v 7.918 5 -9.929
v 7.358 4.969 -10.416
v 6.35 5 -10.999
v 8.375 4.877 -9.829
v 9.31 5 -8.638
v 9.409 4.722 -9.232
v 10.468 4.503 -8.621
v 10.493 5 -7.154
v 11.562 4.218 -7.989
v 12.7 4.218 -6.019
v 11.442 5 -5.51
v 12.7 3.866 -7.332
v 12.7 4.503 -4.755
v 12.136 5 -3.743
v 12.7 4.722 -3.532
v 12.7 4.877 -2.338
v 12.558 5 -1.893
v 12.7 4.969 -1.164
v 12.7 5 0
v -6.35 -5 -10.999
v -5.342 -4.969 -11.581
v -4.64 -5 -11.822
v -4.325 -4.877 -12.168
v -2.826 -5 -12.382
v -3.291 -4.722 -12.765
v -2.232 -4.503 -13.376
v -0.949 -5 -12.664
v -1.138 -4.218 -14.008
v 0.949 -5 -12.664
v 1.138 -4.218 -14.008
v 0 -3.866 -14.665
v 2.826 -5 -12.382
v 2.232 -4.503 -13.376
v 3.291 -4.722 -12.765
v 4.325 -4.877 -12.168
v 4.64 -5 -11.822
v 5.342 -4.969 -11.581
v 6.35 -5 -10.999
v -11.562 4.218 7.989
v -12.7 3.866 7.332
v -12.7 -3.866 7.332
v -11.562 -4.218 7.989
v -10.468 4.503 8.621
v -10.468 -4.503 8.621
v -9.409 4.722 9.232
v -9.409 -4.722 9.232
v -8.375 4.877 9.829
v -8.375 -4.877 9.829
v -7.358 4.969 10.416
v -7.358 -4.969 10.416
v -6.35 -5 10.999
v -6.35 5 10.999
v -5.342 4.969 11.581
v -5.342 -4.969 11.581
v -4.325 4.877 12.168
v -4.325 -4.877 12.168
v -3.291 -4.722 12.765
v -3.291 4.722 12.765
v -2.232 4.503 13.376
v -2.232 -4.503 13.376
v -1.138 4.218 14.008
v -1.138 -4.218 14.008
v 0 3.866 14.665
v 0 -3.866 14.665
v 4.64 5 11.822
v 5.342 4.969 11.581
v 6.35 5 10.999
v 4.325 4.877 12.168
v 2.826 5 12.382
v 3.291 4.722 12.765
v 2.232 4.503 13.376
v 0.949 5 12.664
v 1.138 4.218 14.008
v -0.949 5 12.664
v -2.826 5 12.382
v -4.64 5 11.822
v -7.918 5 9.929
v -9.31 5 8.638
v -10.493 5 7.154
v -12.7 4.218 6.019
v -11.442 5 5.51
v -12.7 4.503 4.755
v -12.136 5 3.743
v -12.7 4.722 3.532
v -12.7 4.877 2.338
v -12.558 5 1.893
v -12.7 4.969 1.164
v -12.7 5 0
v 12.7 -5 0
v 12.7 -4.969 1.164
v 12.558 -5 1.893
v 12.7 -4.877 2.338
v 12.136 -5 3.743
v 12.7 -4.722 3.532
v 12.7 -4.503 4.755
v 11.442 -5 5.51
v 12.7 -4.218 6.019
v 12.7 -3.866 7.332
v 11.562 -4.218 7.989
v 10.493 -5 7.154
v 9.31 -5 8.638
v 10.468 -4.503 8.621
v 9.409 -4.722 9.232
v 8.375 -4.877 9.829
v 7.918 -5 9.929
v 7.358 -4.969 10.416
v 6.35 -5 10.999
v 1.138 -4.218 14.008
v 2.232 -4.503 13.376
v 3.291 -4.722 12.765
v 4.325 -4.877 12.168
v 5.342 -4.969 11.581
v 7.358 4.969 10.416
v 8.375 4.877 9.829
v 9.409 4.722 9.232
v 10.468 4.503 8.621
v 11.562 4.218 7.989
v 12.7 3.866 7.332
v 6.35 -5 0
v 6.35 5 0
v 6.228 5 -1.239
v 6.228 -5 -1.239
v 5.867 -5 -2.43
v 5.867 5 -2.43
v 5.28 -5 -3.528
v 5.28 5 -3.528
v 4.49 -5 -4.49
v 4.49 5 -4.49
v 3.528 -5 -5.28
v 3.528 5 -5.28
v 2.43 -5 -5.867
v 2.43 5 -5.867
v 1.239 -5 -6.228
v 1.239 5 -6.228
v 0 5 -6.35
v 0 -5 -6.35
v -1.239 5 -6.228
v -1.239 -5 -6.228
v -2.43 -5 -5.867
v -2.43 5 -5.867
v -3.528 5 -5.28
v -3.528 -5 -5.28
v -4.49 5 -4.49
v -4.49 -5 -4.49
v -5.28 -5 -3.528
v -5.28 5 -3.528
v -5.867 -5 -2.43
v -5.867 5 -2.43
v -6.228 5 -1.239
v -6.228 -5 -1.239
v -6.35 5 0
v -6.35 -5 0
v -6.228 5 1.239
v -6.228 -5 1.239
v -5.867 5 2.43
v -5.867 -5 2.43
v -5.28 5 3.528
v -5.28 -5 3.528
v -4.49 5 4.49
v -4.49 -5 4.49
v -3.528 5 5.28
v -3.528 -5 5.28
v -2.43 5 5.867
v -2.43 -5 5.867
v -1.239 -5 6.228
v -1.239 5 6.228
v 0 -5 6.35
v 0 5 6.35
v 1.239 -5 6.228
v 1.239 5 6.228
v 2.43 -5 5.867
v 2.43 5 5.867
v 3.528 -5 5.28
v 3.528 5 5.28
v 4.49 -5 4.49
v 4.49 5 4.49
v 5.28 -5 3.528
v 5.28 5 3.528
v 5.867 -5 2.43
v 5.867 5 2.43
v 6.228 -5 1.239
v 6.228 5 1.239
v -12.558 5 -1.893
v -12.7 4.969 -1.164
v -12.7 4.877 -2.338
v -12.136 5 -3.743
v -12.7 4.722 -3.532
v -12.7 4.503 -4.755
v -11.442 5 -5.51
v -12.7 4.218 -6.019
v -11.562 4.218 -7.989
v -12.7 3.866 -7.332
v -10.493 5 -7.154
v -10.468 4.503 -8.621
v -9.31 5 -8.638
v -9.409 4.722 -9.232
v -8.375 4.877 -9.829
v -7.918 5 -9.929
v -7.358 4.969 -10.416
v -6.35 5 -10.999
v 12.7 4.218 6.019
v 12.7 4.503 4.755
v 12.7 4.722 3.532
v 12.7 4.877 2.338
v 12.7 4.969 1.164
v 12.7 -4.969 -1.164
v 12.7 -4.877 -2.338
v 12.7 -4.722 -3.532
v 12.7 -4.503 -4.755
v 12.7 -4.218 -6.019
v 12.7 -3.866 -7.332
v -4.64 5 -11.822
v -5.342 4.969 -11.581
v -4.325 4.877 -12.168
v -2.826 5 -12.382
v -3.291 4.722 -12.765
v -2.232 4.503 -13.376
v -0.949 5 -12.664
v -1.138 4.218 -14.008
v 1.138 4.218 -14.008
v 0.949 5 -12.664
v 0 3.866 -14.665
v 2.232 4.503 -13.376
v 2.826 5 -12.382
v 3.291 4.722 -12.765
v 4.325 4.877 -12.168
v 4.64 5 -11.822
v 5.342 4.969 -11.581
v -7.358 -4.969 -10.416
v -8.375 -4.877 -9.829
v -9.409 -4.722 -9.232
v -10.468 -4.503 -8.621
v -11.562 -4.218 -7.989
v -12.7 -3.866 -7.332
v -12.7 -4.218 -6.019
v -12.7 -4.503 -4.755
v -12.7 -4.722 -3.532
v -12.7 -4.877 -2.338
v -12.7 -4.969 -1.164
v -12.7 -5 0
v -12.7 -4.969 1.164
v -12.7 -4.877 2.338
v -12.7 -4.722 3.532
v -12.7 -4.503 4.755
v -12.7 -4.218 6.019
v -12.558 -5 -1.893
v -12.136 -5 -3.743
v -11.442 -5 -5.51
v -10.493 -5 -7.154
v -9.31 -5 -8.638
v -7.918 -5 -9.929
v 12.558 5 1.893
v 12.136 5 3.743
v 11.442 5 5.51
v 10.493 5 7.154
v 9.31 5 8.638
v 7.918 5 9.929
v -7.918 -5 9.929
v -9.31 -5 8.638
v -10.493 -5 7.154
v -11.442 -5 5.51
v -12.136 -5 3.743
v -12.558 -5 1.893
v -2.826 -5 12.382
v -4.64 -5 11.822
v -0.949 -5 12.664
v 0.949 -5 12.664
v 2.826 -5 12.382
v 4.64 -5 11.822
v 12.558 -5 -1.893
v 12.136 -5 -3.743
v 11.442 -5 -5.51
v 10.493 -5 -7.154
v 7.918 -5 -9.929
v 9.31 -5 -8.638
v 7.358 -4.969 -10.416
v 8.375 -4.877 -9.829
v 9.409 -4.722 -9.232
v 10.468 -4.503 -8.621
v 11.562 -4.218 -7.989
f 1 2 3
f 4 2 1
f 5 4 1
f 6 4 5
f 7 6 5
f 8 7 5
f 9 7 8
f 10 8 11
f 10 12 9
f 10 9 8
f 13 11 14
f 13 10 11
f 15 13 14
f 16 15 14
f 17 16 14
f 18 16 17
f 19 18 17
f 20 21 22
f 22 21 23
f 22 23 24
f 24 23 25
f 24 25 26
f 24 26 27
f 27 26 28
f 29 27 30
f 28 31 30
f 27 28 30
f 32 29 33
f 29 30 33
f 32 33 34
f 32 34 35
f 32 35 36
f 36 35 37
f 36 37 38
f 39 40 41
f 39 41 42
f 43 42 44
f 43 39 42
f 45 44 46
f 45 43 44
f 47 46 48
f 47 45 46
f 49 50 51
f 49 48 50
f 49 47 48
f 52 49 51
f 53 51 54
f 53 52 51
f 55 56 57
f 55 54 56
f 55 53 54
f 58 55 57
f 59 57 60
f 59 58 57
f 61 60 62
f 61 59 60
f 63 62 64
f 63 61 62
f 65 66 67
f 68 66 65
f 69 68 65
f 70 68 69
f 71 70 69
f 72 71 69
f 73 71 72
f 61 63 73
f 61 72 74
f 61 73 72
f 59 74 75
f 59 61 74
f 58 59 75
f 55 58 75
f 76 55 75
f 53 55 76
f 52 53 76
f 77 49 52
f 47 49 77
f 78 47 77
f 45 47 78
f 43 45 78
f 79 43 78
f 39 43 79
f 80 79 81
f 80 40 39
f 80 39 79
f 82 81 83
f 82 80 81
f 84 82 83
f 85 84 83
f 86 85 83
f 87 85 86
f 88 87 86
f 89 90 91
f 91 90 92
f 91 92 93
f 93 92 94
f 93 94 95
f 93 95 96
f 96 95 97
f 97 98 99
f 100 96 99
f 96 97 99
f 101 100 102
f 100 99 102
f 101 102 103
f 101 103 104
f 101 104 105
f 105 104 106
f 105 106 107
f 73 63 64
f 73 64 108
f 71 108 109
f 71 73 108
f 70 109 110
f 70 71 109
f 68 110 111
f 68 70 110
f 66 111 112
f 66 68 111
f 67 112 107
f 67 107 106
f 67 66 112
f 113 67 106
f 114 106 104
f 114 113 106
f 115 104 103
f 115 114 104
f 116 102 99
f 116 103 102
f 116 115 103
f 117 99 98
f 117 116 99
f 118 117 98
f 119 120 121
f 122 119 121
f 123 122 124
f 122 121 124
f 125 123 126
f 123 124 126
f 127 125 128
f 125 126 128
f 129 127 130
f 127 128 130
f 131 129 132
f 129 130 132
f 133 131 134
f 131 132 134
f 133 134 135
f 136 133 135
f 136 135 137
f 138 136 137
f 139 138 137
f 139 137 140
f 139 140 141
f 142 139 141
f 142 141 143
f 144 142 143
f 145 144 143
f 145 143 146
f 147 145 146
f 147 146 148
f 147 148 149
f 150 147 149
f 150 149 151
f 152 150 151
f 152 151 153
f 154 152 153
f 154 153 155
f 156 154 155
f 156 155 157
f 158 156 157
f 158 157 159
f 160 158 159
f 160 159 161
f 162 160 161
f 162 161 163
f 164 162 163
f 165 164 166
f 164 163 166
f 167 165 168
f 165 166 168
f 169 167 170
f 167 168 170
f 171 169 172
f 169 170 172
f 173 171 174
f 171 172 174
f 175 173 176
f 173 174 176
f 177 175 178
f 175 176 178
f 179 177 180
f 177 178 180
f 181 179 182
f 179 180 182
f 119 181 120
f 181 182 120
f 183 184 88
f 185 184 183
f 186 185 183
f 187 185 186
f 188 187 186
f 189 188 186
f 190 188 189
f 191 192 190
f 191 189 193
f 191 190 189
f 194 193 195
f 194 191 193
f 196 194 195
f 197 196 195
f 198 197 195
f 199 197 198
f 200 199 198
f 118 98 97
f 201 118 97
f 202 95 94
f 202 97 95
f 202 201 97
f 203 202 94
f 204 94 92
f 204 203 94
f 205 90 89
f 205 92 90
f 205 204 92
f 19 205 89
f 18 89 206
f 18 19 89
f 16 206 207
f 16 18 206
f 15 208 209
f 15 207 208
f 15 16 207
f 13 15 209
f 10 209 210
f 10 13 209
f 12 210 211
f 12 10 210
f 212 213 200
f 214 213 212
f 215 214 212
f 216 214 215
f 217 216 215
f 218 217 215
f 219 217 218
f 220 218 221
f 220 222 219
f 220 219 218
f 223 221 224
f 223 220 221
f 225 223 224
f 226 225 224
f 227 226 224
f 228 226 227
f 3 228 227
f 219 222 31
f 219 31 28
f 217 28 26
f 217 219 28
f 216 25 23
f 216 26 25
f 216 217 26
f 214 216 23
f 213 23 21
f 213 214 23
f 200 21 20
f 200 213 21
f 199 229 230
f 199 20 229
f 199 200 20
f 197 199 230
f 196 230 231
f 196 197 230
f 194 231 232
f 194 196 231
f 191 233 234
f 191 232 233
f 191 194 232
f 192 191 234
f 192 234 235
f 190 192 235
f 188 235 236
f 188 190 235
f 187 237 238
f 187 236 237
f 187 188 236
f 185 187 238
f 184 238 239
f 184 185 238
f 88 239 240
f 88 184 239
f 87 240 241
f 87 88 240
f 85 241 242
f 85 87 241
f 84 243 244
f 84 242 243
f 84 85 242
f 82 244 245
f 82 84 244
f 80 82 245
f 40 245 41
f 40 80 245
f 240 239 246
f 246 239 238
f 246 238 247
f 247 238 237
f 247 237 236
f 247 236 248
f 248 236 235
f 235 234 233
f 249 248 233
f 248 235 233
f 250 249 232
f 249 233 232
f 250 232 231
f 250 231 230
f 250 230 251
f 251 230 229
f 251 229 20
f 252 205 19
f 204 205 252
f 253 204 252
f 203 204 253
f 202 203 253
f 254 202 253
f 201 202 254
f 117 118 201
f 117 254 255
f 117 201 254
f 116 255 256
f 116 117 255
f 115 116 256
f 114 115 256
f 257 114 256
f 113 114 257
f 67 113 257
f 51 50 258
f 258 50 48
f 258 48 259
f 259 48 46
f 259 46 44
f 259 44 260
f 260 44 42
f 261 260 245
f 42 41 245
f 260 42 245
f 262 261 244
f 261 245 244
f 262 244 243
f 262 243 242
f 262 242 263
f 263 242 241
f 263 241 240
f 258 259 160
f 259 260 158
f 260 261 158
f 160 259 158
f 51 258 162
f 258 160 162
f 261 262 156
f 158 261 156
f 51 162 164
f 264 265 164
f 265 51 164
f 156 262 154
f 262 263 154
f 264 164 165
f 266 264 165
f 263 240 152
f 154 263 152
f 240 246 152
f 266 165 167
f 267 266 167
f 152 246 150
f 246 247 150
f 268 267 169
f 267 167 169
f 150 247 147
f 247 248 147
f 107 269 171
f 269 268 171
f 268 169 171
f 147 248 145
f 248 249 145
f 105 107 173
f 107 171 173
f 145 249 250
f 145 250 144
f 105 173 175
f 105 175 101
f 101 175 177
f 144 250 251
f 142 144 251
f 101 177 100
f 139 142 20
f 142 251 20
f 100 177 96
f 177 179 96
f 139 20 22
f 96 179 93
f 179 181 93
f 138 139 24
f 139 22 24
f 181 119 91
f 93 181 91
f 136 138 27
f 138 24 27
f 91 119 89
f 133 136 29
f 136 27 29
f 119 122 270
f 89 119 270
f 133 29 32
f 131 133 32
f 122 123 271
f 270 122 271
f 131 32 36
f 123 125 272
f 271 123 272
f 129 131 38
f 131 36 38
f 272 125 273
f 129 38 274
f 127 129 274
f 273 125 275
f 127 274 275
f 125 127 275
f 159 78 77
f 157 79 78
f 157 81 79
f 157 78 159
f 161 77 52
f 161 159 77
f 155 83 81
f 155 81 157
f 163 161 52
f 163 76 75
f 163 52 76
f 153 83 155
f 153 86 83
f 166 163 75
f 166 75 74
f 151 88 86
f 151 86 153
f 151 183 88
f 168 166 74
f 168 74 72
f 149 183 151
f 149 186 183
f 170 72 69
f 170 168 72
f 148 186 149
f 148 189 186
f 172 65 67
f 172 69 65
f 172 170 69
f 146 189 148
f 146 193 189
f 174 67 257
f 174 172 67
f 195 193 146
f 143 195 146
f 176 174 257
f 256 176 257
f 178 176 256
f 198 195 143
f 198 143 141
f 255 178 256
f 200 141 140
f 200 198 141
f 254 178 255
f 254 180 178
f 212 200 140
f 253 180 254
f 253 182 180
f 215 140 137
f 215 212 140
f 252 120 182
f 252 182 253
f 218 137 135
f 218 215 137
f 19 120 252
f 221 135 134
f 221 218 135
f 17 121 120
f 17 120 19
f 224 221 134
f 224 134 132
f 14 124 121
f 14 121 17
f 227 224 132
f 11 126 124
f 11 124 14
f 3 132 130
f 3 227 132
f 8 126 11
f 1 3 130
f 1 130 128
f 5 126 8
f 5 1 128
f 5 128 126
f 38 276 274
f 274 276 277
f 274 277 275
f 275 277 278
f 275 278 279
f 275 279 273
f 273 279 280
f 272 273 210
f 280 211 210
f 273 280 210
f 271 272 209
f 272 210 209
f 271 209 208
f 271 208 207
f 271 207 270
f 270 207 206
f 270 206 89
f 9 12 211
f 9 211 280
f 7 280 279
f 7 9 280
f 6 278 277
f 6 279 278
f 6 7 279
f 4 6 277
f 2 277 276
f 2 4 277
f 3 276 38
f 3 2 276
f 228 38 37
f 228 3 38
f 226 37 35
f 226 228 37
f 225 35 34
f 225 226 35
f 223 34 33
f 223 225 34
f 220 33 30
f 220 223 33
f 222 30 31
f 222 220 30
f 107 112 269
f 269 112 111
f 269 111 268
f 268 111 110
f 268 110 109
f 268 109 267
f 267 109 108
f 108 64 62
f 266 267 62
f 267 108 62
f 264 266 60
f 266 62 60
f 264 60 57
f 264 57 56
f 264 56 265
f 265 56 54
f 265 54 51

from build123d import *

# Parameters (mm, degrees)
BOSS_EXTRUDE1_DEPTH = 5
SKETCH2_R           = 6.35
CUT_EXTRUDE1_DEPTH  = 11
SKETCH3_OUTSIDE_W   = 73.518
SKETCH3_OUTSIDE_H   = 77.448
SKETCH3_OUTSIDE_R   = 12.7
CUT_EXTRUDE2_DEPTH  = 11
CUT_EXTRUDE2_TAPER  = 60


with BuildPart() as part:
    # Sketch1 → Boss-Extrude1 (new body, symmetric)
    with BuildSketch(Plane(origin=(0, 0, 0), x_dir=(1, 0, 0), z_dir=(0, 1, 0))):
        Polygon((-12.7, -7.332348419), (0, -14.664696837), (12.7, -7.332348419), (12.7, 7.332348419), (0, 14.664696837), (-12.7, 7.332348419), align=None)
    extrude(amount=BOSS_EXTRUDE1_DEPTH, both=True)

    # Sketch2 → Cut-Extrude1 (cut, through all)
    with BuildSketch(Plane(origin=(0, 5, 0), x_dir=(1, 0, 0), z_dir=(0, 1, 0))):
        Circle(SKETCH2_R)
    extrude(amount=-CUT_EXTRUDE1_DEPTH, mode=Mode.SUBTRACT)

    # Sketch3 outside → Cut-Extrude2 (cut, through all)
    with BuildSketch(Plane(origin=(0, 5, 0), x_dir=(1, 0, 0), z_dir=(0, 1, 0))):
        Rectangle(SKETCH3_OUTSIDE_W, SKETCH3_OUTSIDE_H)
        Circle(SKETCH3_OUTSIDE_R, mode=Mode.SUBTRACT)
    cut_extrude2 = extrude(amount=-CUT_EXTRUDE2_DEPTH, taper=CUT_EXTRUDE2_TAPER, mode=Mode.SUBTRACT)

    # Mirror1: Cut-Extrude2 across plane
    add(cut_extrude2.mirror(Plane.ZX), mode=Mode.SUBTRACT)


solid = part.part
